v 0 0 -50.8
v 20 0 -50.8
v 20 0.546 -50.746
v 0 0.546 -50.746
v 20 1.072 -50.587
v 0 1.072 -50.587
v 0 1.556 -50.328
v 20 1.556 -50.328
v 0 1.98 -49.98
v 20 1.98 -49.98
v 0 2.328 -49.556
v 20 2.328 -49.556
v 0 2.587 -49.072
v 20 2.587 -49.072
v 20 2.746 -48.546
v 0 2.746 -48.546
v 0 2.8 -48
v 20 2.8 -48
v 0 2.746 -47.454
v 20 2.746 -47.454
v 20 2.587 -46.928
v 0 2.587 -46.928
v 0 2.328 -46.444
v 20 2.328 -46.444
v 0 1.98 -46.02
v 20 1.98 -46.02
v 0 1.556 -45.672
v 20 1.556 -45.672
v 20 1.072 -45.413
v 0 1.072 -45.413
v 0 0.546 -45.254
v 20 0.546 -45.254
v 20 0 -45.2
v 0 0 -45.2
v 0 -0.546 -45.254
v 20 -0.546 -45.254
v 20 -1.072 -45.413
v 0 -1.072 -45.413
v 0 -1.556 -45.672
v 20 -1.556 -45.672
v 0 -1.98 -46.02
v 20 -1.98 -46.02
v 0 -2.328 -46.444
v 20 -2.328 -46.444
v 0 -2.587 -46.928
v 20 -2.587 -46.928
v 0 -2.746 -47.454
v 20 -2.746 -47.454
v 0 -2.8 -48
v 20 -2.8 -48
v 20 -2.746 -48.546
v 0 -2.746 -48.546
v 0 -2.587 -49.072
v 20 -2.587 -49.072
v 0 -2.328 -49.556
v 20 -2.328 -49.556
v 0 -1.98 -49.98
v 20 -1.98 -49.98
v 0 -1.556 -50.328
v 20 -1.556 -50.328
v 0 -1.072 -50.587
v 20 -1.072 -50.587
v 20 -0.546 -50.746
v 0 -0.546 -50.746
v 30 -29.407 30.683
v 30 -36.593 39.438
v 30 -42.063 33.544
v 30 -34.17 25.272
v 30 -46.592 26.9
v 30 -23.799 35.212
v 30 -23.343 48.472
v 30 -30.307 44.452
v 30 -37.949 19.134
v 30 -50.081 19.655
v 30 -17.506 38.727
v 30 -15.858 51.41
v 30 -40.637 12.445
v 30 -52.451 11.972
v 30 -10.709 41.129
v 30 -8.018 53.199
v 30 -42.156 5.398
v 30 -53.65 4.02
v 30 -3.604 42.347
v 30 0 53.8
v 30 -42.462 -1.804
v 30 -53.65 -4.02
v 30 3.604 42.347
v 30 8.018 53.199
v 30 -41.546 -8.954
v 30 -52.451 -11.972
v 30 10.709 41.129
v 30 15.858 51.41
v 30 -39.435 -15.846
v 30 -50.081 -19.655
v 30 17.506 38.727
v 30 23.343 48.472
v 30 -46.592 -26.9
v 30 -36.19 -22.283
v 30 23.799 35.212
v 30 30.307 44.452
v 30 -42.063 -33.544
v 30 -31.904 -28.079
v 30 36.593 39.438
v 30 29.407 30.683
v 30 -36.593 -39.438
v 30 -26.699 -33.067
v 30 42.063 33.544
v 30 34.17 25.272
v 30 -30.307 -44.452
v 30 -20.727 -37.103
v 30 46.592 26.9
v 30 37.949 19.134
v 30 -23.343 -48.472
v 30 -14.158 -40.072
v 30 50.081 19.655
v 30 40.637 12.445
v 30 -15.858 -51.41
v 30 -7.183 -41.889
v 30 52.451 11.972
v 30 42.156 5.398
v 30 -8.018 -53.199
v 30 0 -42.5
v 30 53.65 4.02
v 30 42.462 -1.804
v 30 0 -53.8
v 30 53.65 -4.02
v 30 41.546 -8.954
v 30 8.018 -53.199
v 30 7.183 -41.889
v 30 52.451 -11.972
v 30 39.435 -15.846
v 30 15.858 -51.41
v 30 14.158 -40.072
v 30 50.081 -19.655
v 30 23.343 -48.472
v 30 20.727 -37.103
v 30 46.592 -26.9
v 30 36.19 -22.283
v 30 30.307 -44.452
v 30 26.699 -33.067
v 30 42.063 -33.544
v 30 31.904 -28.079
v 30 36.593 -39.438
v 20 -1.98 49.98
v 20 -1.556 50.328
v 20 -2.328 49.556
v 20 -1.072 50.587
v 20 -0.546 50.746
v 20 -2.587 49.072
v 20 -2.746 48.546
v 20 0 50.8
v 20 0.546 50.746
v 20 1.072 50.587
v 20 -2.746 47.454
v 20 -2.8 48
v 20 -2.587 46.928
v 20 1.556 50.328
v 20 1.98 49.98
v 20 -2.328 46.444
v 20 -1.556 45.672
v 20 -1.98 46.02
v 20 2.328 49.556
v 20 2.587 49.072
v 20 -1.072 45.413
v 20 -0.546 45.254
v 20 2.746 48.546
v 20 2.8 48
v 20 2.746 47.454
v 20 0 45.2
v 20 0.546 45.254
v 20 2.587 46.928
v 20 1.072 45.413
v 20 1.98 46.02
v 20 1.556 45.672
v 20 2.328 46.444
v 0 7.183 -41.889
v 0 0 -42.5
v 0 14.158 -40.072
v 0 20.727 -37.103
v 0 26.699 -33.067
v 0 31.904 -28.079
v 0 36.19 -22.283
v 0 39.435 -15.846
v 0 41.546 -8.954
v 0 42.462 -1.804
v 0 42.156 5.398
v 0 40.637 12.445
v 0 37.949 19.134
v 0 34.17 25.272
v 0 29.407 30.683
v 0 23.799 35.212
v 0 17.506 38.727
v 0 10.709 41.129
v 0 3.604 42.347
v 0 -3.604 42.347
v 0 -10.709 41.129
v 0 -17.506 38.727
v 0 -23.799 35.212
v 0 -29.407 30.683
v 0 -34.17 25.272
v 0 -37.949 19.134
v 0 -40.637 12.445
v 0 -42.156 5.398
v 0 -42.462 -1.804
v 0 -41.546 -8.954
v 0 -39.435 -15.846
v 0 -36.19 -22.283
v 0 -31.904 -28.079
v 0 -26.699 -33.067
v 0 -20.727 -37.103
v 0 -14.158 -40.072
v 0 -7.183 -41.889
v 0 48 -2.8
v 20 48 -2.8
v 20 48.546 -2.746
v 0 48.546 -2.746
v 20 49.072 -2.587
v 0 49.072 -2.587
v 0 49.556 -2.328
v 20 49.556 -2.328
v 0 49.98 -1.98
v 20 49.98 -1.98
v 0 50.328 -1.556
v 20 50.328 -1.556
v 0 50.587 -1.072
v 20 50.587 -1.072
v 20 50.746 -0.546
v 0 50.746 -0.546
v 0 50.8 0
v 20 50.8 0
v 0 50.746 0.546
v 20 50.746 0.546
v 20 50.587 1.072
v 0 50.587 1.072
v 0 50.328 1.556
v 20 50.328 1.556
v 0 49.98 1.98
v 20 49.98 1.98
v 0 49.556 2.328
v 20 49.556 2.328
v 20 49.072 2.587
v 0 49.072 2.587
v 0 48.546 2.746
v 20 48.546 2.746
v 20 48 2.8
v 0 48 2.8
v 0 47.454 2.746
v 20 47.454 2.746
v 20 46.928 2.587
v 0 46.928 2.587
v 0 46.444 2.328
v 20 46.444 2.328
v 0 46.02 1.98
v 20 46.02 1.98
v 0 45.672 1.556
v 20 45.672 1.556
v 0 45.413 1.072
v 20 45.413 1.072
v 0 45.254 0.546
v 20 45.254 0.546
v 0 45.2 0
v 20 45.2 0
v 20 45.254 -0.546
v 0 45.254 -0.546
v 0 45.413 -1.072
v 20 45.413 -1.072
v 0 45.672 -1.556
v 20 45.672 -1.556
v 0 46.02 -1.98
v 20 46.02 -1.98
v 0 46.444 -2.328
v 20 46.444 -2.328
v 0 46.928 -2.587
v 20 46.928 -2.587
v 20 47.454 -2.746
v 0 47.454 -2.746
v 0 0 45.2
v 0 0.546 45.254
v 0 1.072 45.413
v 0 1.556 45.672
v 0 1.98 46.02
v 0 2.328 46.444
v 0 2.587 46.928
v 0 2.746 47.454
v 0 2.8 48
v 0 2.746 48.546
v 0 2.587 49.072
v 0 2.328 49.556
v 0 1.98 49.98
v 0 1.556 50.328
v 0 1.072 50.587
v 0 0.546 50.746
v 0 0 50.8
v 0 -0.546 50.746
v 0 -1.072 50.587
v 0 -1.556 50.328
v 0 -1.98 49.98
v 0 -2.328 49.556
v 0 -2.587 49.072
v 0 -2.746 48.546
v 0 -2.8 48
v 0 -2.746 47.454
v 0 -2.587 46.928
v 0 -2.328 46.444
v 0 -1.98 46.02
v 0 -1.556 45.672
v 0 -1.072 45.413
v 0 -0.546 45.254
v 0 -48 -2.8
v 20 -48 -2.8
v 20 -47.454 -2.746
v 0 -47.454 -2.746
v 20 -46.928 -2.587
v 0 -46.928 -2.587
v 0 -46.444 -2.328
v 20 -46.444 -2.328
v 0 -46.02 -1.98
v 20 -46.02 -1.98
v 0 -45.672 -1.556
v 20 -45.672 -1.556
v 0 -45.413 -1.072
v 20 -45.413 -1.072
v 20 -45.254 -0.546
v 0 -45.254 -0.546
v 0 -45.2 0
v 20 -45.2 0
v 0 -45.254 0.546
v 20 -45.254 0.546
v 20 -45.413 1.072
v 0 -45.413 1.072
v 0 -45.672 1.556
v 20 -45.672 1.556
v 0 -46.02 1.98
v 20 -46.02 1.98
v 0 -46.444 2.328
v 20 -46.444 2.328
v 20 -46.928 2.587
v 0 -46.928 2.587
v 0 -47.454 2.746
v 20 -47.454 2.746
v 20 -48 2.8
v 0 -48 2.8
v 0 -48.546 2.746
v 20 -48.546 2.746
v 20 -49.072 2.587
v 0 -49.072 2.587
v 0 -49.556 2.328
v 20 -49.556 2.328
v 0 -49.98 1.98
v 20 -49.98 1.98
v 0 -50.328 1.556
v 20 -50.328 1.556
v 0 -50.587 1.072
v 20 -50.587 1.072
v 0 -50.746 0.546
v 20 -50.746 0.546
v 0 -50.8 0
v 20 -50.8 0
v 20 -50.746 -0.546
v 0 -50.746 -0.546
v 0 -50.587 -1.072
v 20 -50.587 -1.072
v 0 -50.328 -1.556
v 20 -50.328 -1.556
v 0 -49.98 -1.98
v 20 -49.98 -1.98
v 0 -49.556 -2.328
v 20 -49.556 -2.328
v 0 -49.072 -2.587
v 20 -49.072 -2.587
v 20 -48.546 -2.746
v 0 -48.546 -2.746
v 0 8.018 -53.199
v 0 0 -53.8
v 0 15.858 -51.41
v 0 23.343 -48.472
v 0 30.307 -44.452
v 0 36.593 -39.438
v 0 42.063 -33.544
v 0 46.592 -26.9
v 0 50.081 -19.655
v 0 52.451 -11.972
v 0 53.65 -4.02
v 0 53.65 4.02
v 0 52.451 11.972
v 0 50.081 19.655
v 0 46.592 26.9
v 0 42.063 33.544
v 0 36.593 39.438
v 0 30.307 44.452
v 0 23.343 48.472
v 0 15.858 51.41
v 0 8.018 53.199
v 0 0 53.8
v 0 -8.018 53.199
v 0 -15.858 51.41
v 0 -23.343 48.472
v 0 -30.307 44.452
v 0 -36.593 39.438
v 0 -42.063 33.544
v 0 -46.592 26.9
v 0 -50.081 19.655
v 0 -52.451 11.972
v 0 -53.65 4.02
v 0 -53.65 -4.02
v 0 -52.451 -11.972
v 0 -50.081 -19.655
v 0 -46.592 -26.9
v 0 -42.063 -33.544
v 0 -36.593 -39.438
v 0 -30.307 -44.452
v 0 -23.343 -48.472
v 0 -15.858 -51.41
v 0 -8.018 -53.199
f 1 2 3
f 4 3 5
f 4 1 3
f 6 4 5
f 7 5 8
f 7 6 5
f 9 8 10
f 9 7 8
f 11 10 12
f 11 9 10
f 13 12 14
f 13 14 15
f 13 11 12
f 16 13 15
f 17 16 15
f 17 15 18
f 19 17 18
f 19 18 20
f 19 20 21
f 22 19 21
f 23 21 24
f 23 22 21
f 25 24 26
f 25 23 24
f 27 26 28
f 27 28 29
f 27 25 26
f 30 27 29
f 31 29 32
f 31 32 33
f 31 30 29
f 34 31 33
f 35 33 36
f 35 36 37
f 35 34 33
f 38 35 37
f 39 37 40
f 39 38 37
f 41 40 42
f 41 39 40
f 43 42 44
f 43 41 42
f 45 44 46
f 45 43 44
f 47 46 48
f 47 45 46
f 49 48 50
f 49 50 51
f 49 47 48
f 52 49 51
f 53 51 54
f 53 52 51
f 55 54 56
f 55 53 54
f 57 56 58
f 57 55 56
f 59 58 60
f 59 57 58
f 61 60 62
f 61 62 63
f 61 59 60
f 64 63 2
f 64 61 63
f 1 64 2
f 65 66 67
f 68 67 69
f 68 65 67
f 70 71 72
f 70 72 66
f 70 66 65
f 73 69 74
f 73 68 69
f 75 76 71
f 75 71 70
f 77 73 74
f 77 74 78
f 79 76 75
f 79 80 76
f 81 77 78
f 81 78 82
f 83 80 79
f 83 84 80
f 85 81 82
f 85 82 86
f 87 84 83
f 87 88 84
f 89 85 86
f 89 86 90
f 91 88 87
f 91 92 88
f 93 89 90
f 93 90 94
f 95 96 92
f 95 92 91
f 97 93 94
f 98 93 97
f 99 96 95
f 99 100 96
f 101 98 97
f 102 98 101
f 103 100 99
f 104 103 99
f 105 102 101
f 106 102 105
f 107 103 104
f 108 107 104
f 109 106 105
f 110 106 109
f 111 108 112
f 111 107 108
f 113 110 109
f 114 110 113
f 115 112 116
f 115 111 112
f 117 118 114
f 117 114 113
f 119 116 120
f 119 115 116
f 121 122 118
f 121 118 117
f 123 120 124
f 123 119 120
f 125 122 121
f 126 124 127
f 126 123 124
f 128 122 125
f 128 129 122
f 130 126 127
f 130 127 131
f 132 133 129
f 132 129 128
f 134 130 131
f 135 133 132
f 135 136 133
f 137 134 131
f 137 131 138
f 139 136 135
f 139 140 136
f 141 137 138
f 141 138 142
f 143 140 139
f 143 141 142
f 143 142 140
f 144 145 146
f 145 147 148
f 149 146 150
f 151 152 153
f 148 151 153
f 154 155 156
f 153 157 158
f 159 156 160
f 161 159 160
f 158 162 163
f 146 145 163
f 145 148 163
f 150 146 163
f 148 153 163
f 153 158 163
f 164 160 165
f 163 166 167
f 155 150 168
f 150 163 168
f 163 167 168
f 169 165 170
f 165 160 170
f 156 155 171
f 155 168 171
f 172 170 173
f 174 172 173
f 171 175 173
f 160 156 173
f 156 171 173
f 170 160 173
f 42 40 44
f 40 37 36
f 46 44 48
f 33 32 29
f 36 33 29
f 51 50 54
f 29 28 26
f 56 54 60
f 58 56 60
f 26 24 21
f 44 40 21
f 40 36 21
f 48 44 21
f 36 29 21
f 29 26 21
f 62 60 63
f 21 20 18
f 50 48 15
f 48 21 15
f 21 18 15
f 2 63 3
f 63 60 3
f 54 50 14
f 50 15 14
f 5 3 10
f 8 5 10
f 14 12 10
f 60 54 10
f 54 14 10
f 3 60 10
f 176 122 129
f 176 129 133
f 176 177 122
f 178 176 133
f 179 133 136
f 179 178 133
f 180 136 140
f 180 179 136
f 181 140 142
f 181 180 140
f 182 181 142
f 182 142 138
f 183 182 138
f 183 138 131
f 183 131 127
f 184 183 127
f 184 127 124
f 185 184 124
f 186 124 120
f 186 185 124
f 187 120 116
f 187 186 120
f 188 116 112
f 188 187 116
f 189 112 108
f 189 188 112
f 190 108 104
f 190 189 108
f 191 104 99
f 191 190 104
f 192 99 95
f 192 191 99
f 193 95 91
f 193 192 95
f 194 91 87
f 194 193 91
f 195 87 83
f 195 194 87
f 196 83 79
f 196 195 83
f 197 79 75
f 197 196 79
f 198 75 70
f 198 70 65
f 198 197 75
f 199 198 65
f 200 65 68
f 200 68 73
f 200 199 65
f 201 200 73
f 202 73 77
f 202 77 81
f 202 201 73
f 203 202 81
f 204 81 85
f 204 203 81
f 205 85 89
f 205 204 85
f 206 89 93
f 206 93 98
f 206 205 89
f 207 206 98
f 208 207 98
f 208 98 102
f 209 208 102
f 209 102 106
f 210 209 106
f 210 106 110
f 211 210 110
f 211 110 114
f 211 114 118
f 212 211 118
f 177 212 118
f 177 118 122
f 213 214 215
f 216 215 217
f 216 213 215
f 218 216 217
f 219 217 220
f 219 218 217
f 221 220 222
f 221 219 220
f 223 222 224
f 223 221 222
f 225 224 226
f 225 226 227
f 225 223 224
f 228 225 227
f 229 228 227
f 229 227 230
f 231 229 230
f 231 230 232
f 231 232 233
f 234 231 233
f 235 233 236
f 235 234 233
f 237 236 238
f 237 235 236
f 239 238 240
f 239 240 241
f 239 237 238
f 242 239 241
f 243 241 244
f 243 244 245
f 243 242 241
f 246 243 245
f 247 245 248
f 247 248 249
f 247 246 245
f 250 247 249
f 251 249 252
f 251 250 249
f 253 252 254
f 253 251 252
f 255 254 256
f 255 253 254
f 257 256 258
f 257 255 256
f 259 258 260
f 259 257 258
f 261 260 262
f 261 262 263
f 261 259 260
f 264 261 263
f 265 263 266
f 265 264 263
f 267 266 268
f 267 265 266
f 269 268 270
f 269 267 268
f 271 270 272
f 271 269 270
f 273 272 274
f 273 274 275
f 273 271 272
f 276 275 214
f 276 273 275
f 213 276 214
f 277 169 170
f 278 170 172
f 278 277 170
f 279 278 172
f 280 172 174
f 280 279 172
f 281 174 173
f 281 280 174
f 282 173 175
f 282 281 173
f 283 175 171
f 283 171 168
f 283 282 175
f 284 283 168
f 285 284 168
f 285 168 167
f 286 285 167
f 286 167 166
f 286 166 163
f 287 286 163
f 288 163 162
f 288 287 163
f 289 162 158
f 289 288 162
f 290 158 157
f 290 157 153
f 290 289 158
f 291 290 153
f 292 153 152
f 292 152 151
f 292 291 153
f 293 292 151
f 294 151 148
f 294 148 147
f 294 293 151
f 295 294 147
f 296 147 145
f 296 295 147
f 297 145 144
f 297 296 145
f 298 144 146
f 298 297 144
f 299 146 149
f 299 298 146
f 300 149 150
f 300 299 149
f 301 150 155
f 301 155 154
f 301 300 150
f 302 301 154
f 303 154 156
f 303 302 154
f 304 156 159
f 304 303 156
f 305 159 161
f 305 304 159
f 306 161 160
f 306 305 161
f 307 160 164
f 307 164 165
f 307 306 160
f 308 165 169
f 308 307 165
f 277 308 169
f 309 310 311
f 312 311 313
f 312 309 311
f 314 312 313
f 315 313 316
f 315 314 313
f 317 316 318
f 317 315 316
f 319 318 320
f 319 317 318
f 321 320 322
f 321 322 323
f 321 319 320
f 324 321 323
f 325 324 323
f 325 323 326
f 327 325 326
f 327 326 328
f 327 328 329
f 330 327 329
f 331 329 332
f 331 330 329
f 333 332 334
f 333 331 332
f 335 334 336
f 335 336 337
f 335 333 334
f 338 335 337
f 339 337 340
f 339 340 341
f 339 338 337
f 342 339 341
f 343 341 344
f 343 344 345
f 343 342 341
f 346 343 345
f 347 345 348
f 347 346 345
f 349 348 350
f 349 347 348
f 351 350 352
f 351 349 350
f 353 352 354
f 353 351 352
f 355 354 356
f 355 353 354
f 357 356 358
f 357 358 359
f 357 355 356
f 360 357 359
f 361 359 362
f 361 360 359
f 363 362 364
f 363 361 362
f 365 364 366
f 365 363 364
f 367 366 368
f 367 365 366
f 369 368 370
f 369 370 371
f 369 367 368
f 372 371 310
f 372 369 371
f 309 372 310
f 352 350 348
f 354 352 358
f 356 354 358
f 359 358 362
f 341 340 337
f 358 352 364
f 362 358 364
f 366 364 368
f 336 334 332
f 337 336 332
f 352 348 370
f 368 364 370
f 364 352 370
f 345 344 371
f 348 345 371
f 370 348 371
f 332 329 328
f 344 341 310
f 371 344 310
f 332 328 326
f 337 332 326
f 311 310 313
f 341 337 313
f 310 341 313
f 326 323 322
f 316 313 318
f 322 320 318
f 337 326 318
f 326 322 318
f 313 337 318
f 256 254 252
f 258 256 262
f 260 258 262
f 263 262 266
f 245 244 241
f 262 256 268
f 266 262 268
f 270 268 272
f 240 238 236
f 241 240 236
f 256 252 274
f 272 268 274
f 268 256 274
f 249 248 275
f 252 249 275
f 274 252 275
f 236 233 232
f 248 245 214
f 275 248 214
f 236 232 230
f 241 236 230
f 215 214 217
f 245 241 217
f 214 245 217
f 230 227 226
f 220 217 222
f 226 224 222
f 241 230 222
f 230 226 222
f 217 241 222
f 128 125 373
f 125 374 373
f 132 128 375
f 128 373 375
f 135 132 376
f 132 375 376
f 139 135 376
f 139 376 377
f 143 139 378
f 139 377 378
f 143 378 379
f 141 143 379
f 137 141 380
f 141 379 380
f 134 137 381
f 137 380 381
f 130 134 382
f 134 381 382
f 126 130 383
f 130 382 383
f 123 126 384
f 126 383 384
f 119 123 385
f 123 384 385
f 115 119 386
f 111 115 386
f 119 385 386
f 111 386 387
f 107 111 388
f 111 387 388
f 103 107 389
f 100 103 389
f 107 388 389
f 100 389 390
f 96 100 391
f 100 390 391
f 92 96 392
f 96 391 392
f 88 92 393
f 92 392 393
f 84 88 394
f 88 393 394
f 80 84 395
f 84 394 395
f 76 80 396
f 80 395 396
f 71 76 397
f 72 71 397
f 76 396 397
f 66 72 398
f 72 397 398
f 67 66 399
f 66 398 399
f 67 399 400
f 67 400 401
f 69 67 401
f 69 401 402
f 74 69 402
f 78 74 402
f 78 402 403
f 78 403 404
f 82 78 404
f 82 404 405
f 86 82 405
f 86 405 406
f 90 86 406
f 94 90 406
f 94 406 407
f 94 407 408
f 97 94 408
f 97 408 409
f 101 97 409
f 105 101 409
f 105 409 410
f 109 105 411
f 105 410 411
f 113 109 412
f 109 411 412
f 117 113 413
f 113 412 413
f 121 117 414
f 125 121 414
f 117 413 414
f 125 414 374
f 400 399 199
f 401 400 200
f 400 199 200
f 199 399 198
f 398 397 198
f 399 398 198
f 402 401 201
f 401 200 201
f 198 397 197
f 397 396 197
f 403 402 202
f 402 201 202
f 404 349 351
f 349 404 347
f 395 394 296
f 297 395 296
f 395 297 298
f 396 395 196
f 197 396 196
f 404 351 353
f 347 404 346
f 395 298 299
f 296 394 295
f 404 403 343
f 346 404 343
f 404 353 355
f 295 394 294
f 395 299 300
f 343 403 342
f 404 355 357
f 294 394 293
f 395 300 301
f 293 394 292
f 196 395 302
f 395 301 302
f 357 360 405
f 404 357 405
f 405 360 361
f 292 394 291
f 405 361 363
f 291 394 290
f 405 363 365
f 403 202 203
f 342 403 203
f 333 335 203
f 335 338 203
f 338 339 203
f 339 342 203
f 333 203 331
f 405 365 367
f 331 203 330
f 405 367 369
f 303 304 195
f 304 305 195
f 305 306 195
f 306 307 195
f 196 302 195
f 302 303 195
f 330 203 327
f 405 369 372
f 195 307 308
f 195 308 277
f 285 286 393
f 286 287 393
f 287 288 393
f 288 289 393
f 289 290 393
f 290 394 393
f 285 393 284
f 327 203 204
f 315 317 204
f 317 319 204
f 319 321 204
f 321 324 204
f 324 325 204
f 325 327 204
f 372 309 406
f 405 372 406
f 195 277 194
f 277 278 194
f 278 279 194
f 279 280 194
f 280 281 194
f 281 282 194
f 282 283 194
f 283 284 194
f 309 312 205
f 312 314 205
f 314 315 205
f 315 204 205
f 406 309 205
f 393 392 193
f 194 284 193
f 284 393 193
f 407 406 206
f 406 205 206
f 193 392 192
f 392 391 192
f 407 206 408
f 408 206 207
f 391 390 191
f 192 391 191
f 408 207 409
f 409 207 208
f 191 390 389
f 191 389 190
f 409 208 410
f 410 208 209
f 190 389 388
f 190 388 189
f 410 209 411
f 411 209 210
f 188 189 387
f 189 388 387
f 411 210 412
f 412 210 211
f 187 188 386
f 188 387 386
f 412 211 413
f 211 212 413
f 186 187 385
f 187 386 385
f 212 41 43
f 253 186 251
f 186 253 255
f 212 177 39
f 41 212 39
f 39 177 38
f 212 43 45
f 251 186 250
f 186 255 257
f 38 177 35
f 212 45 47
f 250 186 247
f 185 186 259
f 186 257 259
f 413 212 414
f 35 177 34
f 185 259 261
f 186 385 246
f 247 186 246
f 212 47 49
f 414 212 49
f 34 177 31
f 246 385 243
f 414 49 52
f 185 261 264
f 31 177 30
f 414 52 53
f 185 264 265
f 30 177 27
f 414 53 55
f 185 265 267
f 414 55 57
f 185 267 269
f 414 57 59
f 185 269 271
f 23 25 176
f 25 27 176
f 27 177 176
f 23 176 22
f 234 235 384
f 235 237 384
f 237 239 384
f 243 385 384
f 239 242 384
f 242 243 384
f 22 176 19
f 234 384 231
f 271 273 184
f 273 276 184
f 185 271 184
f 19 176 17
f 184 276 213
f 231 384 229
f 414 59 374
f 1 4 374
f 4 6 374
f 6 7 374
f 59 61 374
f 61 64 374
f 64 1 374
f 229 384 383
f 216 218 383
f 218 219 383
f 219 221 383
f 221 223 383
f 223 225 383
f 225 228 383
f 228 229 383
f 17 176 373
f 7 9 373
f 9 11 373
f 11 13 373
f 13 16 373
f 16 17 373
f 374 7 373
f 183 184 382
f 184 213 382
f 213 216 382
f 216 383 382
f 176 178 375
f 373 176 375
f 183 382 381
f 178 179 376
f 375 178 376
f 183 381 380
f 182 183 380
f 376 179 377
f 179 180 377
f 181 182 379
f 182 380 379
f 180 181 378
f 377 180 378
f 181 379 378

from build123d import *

# Parameters (mm, degrees)
SKETCH1_R           = 53.8
SKETCH1_R_2         = 42.5
SKETCH1_R_3         = 2.8
BOSS_EXTRUDE1_DEPTH = 20
SKETCH3_R           = 53.8
SKETCH3_R_2         = 42.5
BOSS_EXTRUDE2_DEPTH = 10


with BuildPart() as part:
    # Sketch1 → Boss-Extrude1 (new body)
    with BuildSketch(Plane(origin=(0, 0, 0), x_dir=(0, 0, -1), z_dir=(1, 0, 0))):
        Circle(SKETCH1_R)
        Circle(SKETCH1_R_2, mode=Mode.SUBTRACT)
        with Locations((0, 48)):
            Circle(SKETCH1_R_3, mode=Mode.SUBTRACT)
        with Locations((48, 0)):
            Circle(SKETCH1_R_3, mode=Mode.SUBTRACT)
        with Locations((0, -48)):
            Circle(SKETCH1_R_3, mode=Mode.SUBTRACT)
        with Locations((-48, 0)):
            Circle(SKETCH1_R_3, mode=Mode.SUBTRACT)
    extrude(amount=BOSS_EXTRUDE1_DEPTH)

    # Sketch3 → Boss-Extrude2 (add)
    with BuildSketch(Plane(origin=(20, 0, 0), x_dir=(0, 0, -1), z_dir=(1, 0, 0))):
        Circle(SKETCH3_R)
        Circle(SKETCH3_R_2, mode=Mode.SUBTRACT)
    extrude(amount=BOSS_EXTRUDE2_DEPTH)


solid = part.part
